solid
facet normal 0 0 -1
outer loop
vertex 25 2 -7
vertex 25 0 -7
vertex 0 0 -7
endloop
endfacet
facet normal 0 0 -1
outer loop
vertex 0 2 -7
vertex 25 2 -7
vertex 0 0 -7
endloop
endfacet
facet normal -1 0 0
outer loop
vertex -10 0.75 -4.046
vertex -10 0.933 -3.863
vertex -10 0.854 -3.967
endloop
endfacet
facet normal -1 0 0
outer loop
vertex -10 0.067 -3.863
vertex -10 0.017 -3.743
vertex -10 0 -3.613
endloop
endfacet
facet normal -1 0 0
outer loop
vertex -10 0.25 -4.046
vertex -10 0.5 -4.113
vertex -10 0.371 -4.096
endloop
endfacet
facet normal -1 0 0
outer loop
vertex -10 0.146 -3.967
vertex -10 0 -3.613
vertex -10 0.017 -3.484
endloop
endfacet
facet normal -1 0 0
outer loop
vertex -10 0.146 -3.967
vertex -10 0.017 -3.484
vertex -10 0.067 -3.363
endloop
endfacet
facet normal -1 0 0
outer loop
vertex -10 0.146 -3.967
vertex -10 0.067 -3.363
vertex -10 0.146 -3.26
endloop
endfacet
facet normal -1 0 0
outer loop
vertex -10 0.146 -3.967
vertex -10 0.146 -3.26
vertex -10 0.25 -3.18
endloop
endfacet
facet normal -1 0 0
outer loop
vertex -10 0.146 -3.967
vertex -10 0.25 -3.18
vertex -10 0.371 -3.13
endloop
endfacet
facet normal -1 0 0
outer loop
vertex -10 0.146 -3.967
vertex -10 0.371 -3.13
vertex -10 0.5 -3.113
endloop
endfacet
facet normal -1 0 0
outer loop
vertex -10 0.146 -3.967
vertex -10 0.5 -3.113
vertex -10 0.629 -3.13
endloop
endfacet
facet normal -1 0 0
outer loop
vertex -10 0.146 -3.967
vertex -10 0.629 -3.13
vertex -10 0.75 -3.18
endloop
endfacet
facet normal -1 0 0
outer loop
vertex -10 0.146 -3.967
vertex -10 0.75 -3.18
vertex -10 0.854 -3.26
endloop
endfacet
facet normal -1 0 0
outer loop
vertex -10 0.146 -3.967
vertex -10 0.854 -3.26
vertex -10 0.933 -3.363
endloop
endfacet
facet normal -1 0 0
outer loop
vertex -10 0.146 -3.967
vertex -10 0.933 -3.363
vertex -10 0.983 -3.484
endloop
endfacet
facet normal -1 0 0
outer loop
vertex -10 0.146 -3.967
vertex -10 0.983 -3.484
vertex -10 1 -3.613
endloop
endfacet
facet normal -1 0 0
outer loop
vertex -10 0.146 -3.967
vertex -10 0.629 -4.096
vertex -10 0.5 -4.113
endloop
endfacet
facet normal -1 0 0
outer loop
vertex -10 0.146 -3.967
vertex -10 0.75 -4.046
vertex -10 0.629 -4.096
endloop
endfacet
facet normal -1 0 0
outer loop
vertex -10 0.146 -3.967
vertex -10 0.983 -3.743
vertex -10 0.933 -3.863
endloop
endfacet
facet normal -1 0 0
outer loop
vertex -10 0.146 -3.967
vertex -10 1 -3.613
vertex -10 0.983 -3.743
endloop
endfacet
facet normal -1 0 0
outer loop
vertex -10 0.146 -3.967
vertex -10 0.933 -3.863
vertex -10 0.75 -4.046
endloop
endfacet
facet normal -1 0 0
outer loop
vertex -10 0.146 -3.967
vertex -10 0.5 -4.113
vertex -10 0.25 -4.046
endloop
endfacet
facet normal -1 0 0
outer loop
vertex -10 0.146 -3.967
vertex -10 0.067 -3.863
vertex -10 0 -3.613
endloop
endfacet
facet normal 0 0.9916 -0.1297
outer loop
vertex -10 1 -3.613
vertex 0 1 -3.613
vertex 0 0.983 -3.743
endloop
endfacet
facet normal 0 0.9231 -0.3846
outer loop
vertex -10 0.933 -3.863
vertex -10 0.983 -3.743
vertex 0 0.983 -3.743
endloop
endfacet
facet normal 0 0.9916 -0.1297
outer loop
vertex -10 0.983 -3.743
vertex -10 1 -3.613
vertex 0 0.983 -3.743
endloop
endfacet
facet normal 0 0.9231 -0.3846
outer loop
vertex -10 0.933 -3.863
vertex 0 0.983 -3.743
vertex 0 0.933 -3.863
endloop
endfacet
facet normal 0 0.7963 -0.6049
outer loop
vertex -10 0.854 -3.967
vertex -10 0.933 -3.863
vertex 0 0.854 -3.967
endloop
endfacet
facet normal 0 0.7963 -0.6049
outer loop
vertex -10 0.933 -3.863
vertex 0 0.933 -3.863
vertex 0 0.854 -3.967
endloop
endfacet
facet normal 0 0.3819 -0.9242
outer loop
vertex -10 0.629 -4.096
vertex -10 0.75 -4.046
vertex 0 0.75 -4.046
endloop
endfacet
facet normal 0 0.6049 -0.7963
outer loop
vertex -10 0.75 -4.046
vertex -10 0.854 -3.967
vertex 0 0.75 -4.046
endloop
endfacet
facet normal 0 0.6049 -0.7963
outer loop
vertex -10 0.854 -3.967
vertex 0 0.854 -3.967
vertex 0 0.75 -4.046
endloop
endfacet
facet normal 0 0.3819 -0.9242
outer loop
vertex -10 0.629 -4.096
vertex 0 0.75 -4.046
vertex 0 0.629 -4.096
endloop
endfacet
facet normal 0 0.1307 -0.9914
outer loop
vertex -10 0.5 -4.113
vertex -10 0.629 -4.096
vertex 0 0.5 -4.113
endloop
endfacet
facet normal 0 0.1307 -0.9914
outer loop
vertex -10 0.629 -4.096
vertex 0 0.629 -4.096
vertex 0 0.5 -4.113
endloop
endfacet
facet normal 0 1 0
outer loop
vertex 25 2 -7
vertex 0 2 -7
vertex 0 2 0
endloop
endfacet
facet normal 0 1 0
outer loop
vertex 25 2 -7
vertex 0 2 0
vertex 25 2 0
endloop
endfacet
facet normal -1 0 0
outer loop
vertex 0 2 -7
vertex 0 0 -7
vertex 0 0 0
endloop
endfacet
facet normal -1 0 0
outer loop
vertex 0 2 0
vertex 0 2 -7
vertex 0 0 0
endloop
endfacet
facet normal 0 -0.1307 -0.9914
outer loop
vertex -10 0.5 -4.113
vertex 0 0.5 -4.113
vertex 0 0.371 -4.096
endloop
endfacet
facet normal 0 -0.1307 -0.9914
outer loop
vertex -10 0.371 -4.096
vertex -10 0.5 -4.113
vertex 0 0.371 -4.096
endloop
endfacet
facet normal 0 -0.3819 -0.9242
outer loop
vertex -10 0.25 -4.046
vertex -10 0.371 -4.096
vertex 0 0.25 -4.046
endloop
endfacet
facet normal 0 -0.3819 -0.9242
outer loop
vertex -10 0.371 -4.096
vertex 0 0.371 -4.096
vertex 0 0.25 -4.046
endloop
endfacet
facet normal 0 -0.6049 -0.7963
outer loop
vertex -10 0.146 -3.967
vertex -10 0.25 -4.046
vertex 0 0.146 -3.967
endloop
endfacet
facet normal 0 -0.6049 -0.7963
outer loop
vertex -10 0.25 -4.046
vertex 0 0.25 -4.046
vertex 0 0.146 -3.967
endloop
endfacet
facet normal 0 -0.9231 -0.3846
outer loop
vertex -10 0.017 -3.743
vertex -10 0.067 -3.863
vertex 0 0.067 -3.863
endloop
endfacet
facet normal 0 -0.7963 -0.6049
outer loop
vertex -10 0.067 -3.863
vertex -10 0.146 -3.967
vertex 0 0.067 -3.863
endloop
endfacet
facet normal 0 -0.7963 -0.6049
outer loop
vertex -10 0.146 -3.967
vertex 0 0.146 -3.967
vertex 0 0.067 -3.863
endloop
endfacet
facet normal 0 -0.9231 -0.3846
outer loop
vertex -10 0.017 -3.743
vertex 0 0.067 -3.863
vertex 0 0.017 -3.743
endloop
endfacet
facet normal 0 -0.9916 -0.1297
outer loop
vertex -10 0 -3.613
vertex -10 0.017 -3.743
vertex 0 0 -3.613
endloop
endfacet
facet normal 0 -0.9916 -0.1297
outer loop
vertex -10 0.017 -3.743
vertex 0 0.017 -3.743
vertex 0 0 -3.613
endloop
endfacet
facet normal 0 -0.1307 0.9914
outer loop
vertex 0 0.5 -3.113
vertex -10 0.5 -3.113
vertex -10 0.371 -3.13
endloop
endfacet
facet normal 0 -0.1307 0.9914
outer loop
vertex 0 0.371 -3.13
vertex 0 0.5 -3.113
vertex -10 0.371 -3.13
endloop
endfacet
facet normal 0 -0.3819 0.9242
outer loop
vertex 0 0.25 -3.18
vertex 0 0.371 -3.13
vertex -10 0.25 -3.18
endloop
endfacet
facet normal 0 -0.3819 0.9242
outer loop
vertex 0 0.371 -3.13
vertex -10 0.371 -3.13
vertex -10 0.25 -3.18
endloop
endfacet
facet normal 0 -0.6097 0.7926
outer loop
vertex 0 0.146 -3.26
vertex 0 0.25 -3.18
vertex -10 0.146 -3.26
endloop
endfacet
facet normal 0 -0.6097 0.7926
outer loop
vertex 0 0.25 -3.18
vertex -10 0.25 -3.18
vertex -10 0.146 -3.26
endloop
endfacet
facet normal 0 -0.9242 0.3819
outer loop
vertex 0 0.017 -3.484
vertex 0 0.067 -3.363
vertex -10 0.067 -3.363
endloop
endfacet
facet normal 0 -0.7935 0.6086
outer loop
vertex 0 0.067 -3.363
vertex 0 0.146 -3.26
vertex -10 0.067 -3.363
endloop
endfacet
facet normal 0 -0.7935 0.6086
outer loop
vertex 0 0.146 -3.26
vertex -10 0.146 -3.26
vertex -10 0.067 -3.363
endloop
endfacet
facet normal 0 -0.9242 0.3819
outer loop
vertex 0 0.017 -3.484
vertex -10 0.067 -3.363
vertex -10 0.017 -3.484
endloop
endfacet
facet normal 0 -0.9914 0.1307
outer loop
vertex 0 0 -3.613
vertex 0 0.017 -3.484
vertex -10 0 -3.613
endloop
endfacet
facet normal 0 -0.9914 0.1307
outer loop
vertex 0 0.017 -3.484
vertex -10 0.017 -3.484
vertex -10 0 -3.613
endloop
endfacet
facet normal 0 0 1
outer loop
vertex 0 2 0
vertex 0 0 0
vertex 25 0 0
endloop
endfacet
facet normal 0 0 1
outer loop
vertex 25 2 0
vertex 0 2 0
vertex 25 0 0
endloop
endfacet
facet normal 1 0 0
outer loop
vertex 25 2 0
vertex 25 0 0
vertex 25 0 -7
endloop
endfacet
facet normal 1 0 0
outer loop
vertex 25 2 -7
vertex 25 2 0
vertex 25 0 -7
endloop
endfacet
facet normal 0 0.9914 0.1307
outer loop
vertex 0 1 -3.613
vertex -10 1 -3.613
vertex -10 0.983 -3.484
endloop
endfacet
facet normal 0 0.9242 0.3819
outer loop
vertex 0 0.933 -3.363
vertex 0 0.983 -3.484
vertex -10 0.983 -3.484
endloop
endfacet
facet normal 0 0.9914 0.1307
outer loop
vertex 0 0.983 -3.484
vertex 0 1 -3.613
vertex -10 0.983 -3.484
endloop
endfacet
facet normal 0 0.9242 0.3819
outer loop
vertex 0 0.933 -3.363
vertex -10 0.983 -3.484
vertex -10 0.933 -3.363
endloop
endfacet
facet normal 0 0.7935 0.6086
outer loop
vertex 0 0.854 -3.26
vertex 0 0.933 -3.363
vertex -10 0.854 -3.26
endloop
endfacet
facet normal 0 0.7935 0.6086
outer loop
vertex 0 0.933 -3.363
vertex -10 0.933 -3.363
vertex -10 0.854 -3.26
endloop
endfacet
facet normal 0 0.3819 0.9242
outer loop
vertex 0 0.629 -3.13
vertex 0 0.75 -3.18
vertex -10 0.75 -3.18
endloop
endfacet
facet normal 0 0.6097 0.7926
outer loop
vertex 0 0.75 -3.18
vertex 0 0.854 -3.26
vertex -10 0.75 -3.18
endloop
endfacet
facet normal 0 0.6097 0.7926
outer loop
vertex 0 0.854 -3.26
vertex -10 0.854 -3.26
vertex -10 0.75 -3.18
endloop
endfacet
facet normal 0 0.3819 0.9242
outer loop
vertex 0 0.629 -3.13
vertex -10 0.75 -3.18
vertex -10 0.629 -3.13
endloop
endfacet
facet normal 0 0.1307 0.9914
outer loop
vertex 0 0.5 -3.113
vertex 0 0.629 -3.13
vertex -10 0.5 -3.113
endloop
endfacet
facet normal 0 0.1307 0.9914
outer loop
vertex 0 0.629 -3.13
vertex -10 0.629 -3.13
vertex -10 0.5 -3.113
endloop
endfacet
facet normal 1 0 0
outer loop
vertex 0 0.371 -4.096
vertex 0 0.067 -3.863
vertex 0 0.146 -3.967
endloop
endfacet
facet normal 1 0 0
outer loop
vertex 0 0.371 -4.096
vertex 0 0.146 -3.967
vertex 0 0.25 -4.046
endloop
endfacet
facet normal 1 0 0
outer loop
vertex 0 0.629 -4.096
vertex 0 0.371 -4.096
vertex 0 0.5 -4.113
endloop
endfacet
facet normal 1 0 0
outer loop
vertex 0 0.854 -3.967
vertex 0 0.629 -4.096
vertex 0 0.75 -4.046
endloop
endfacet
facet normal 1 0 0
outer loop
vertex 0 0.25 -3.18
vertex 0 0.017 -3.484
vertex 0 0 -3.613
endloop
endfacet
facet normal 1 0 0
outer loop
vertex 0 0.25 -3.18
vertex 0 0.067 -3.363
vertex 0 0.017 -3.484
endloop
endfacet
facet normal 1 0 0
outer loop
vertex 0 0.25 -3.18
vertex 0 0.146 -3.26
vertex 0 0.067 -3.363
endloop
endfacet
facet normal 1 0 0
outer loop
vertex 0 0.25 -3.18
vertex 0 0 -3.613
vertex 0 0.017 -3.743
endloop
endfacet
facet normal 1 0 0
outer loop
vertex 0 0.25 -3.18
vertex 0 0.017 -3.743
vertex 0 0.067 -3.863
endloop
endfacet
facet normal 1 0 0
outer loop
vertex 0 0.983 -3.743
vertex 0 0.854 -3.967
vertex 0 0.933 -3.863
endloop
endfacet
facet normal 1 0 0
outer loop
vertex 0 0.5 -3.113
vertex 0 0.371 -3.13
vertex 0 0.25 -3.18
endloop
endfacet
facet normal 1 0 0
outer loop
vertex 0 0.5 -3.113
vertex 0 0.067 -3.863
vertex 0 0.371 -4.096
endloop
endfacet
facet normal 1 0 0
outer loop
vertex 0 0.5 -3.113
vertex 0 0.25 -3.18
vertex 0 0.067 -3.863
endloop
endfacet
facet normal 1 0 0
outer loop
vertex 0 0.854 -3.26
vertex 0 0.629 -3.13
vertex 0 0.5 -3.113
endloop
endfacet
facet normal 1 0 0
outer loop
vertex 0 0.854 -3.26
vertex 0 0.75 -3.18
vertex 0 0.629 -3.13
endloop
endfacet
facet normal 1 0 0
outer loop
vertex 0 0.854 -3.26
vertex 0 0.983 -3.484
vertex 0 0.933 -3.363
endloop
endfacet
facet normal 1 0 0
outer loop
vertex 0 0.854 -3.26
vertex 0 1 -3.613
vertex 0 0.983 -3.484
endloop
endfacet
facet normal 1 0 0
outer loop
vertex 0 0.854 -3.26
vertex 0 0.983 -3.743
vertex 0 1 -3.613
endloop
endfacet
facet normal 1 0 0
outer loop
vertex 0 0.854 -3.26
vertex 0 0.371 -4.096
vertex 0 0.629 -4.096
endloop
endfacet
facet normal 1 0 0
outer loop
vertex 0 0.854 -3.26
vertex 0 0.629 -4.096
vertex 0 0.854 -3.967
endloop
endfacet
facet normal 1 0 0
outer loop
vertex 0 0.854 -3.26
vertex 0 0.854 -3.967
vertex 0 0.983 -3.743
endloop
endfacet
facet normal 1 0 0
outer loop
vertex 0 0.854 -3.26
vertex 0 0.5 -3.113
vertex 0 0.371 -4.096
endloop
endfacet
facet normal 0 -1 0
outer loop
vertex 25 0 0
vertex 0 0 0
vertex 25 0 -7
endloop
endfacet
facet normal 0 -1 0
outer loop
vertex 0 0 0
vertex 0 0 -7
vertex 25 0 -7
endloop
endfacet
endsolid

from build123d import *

# Parameters (mm, degrees)
BOSS_EXTRUDE1_DEPTH = 2
SKETCH1_3_W         = 10
SKETCH1_3_H         = 1
BOSS_EXTRUDE2_DEPTH = 1
FILLET1_R           = 0.5


# Read off the part's stored shape, not the designer's step: Split1
with BuildPart() as part:
    # Sketch1 → Boss-Extrude1 (new body)
    with BuildSketch(Plane(origin=(0, 0, 0), x_dir=(1, 0, 0), z_dir=(0, 1, 0))):
        Polygon((25, 0), (25, 7), (0, 7), (0, 4.113157824), (0, 3.113157824), (0, 0), align=None)
    extrude(amount=BOSS_EXTRUDE1_DEPTH)

    # Sketch1<3> → Boss-Extrude2 (add)
    with BuildSketch(Plane(origin=(0, 0, 0), x_dir=(1, 0, 0), z_dir=(0, 1, 0))):
        with Locations((-5, 3.613157824)):
            Rectangle(SKETCH1_3_W, SKETCH1_3_H)
    extrude(amount=BOSS_EXTRUDE2_DEPTH)


with BuildPart() as body_2:
    # Split1: the piece on the far side of the plane
    add(part.part)
    split(bisect_by=Plane.YZ, keep=Keep.BOTTOM)

    # Fillet1
    # the kernel refuses this fillet: 0.5 mm, written as the material it takes off along each edge
    with BuildSketch(Plane(origin=(1.25, 0, -4.113157824), x_dir=(0, 0, 1), z_dir=(-1, 0, 0)), Plane(origin=(1.25, 1, -4.113157824), x_dir=(0, -1, 0), z_dir=(-1, 0, 0)), Plane(origin=(-11.25, 0, -3.113157824), x_dir=(0, 0, -1), z_dir=(1, 0, 0)), Plane(origin=(-11.25, 1, -3.113157824), x_dir=(0, -1, 0), z_dir=(1, 0, 0))) as fillet1_piece_1:
        with BuildLine():
            CenterArc((FILLET1_R, FILLET1_R), FILLET1_R, 180, 90)
            Line((0, FILLET1_R), (0, 0))
            Line((0, 0), (FILLET1_R, 0))
        make_face()
    extrude(amount=12.5, mode=Mode.SUBTRACT)


with BuildPart() as part_1:
    add(part.part)

    # Split1
    split(bisect_by=Plane.YZ, keep=Keep.TOP)


solid = Compound([body_2.part, part_1.part])
